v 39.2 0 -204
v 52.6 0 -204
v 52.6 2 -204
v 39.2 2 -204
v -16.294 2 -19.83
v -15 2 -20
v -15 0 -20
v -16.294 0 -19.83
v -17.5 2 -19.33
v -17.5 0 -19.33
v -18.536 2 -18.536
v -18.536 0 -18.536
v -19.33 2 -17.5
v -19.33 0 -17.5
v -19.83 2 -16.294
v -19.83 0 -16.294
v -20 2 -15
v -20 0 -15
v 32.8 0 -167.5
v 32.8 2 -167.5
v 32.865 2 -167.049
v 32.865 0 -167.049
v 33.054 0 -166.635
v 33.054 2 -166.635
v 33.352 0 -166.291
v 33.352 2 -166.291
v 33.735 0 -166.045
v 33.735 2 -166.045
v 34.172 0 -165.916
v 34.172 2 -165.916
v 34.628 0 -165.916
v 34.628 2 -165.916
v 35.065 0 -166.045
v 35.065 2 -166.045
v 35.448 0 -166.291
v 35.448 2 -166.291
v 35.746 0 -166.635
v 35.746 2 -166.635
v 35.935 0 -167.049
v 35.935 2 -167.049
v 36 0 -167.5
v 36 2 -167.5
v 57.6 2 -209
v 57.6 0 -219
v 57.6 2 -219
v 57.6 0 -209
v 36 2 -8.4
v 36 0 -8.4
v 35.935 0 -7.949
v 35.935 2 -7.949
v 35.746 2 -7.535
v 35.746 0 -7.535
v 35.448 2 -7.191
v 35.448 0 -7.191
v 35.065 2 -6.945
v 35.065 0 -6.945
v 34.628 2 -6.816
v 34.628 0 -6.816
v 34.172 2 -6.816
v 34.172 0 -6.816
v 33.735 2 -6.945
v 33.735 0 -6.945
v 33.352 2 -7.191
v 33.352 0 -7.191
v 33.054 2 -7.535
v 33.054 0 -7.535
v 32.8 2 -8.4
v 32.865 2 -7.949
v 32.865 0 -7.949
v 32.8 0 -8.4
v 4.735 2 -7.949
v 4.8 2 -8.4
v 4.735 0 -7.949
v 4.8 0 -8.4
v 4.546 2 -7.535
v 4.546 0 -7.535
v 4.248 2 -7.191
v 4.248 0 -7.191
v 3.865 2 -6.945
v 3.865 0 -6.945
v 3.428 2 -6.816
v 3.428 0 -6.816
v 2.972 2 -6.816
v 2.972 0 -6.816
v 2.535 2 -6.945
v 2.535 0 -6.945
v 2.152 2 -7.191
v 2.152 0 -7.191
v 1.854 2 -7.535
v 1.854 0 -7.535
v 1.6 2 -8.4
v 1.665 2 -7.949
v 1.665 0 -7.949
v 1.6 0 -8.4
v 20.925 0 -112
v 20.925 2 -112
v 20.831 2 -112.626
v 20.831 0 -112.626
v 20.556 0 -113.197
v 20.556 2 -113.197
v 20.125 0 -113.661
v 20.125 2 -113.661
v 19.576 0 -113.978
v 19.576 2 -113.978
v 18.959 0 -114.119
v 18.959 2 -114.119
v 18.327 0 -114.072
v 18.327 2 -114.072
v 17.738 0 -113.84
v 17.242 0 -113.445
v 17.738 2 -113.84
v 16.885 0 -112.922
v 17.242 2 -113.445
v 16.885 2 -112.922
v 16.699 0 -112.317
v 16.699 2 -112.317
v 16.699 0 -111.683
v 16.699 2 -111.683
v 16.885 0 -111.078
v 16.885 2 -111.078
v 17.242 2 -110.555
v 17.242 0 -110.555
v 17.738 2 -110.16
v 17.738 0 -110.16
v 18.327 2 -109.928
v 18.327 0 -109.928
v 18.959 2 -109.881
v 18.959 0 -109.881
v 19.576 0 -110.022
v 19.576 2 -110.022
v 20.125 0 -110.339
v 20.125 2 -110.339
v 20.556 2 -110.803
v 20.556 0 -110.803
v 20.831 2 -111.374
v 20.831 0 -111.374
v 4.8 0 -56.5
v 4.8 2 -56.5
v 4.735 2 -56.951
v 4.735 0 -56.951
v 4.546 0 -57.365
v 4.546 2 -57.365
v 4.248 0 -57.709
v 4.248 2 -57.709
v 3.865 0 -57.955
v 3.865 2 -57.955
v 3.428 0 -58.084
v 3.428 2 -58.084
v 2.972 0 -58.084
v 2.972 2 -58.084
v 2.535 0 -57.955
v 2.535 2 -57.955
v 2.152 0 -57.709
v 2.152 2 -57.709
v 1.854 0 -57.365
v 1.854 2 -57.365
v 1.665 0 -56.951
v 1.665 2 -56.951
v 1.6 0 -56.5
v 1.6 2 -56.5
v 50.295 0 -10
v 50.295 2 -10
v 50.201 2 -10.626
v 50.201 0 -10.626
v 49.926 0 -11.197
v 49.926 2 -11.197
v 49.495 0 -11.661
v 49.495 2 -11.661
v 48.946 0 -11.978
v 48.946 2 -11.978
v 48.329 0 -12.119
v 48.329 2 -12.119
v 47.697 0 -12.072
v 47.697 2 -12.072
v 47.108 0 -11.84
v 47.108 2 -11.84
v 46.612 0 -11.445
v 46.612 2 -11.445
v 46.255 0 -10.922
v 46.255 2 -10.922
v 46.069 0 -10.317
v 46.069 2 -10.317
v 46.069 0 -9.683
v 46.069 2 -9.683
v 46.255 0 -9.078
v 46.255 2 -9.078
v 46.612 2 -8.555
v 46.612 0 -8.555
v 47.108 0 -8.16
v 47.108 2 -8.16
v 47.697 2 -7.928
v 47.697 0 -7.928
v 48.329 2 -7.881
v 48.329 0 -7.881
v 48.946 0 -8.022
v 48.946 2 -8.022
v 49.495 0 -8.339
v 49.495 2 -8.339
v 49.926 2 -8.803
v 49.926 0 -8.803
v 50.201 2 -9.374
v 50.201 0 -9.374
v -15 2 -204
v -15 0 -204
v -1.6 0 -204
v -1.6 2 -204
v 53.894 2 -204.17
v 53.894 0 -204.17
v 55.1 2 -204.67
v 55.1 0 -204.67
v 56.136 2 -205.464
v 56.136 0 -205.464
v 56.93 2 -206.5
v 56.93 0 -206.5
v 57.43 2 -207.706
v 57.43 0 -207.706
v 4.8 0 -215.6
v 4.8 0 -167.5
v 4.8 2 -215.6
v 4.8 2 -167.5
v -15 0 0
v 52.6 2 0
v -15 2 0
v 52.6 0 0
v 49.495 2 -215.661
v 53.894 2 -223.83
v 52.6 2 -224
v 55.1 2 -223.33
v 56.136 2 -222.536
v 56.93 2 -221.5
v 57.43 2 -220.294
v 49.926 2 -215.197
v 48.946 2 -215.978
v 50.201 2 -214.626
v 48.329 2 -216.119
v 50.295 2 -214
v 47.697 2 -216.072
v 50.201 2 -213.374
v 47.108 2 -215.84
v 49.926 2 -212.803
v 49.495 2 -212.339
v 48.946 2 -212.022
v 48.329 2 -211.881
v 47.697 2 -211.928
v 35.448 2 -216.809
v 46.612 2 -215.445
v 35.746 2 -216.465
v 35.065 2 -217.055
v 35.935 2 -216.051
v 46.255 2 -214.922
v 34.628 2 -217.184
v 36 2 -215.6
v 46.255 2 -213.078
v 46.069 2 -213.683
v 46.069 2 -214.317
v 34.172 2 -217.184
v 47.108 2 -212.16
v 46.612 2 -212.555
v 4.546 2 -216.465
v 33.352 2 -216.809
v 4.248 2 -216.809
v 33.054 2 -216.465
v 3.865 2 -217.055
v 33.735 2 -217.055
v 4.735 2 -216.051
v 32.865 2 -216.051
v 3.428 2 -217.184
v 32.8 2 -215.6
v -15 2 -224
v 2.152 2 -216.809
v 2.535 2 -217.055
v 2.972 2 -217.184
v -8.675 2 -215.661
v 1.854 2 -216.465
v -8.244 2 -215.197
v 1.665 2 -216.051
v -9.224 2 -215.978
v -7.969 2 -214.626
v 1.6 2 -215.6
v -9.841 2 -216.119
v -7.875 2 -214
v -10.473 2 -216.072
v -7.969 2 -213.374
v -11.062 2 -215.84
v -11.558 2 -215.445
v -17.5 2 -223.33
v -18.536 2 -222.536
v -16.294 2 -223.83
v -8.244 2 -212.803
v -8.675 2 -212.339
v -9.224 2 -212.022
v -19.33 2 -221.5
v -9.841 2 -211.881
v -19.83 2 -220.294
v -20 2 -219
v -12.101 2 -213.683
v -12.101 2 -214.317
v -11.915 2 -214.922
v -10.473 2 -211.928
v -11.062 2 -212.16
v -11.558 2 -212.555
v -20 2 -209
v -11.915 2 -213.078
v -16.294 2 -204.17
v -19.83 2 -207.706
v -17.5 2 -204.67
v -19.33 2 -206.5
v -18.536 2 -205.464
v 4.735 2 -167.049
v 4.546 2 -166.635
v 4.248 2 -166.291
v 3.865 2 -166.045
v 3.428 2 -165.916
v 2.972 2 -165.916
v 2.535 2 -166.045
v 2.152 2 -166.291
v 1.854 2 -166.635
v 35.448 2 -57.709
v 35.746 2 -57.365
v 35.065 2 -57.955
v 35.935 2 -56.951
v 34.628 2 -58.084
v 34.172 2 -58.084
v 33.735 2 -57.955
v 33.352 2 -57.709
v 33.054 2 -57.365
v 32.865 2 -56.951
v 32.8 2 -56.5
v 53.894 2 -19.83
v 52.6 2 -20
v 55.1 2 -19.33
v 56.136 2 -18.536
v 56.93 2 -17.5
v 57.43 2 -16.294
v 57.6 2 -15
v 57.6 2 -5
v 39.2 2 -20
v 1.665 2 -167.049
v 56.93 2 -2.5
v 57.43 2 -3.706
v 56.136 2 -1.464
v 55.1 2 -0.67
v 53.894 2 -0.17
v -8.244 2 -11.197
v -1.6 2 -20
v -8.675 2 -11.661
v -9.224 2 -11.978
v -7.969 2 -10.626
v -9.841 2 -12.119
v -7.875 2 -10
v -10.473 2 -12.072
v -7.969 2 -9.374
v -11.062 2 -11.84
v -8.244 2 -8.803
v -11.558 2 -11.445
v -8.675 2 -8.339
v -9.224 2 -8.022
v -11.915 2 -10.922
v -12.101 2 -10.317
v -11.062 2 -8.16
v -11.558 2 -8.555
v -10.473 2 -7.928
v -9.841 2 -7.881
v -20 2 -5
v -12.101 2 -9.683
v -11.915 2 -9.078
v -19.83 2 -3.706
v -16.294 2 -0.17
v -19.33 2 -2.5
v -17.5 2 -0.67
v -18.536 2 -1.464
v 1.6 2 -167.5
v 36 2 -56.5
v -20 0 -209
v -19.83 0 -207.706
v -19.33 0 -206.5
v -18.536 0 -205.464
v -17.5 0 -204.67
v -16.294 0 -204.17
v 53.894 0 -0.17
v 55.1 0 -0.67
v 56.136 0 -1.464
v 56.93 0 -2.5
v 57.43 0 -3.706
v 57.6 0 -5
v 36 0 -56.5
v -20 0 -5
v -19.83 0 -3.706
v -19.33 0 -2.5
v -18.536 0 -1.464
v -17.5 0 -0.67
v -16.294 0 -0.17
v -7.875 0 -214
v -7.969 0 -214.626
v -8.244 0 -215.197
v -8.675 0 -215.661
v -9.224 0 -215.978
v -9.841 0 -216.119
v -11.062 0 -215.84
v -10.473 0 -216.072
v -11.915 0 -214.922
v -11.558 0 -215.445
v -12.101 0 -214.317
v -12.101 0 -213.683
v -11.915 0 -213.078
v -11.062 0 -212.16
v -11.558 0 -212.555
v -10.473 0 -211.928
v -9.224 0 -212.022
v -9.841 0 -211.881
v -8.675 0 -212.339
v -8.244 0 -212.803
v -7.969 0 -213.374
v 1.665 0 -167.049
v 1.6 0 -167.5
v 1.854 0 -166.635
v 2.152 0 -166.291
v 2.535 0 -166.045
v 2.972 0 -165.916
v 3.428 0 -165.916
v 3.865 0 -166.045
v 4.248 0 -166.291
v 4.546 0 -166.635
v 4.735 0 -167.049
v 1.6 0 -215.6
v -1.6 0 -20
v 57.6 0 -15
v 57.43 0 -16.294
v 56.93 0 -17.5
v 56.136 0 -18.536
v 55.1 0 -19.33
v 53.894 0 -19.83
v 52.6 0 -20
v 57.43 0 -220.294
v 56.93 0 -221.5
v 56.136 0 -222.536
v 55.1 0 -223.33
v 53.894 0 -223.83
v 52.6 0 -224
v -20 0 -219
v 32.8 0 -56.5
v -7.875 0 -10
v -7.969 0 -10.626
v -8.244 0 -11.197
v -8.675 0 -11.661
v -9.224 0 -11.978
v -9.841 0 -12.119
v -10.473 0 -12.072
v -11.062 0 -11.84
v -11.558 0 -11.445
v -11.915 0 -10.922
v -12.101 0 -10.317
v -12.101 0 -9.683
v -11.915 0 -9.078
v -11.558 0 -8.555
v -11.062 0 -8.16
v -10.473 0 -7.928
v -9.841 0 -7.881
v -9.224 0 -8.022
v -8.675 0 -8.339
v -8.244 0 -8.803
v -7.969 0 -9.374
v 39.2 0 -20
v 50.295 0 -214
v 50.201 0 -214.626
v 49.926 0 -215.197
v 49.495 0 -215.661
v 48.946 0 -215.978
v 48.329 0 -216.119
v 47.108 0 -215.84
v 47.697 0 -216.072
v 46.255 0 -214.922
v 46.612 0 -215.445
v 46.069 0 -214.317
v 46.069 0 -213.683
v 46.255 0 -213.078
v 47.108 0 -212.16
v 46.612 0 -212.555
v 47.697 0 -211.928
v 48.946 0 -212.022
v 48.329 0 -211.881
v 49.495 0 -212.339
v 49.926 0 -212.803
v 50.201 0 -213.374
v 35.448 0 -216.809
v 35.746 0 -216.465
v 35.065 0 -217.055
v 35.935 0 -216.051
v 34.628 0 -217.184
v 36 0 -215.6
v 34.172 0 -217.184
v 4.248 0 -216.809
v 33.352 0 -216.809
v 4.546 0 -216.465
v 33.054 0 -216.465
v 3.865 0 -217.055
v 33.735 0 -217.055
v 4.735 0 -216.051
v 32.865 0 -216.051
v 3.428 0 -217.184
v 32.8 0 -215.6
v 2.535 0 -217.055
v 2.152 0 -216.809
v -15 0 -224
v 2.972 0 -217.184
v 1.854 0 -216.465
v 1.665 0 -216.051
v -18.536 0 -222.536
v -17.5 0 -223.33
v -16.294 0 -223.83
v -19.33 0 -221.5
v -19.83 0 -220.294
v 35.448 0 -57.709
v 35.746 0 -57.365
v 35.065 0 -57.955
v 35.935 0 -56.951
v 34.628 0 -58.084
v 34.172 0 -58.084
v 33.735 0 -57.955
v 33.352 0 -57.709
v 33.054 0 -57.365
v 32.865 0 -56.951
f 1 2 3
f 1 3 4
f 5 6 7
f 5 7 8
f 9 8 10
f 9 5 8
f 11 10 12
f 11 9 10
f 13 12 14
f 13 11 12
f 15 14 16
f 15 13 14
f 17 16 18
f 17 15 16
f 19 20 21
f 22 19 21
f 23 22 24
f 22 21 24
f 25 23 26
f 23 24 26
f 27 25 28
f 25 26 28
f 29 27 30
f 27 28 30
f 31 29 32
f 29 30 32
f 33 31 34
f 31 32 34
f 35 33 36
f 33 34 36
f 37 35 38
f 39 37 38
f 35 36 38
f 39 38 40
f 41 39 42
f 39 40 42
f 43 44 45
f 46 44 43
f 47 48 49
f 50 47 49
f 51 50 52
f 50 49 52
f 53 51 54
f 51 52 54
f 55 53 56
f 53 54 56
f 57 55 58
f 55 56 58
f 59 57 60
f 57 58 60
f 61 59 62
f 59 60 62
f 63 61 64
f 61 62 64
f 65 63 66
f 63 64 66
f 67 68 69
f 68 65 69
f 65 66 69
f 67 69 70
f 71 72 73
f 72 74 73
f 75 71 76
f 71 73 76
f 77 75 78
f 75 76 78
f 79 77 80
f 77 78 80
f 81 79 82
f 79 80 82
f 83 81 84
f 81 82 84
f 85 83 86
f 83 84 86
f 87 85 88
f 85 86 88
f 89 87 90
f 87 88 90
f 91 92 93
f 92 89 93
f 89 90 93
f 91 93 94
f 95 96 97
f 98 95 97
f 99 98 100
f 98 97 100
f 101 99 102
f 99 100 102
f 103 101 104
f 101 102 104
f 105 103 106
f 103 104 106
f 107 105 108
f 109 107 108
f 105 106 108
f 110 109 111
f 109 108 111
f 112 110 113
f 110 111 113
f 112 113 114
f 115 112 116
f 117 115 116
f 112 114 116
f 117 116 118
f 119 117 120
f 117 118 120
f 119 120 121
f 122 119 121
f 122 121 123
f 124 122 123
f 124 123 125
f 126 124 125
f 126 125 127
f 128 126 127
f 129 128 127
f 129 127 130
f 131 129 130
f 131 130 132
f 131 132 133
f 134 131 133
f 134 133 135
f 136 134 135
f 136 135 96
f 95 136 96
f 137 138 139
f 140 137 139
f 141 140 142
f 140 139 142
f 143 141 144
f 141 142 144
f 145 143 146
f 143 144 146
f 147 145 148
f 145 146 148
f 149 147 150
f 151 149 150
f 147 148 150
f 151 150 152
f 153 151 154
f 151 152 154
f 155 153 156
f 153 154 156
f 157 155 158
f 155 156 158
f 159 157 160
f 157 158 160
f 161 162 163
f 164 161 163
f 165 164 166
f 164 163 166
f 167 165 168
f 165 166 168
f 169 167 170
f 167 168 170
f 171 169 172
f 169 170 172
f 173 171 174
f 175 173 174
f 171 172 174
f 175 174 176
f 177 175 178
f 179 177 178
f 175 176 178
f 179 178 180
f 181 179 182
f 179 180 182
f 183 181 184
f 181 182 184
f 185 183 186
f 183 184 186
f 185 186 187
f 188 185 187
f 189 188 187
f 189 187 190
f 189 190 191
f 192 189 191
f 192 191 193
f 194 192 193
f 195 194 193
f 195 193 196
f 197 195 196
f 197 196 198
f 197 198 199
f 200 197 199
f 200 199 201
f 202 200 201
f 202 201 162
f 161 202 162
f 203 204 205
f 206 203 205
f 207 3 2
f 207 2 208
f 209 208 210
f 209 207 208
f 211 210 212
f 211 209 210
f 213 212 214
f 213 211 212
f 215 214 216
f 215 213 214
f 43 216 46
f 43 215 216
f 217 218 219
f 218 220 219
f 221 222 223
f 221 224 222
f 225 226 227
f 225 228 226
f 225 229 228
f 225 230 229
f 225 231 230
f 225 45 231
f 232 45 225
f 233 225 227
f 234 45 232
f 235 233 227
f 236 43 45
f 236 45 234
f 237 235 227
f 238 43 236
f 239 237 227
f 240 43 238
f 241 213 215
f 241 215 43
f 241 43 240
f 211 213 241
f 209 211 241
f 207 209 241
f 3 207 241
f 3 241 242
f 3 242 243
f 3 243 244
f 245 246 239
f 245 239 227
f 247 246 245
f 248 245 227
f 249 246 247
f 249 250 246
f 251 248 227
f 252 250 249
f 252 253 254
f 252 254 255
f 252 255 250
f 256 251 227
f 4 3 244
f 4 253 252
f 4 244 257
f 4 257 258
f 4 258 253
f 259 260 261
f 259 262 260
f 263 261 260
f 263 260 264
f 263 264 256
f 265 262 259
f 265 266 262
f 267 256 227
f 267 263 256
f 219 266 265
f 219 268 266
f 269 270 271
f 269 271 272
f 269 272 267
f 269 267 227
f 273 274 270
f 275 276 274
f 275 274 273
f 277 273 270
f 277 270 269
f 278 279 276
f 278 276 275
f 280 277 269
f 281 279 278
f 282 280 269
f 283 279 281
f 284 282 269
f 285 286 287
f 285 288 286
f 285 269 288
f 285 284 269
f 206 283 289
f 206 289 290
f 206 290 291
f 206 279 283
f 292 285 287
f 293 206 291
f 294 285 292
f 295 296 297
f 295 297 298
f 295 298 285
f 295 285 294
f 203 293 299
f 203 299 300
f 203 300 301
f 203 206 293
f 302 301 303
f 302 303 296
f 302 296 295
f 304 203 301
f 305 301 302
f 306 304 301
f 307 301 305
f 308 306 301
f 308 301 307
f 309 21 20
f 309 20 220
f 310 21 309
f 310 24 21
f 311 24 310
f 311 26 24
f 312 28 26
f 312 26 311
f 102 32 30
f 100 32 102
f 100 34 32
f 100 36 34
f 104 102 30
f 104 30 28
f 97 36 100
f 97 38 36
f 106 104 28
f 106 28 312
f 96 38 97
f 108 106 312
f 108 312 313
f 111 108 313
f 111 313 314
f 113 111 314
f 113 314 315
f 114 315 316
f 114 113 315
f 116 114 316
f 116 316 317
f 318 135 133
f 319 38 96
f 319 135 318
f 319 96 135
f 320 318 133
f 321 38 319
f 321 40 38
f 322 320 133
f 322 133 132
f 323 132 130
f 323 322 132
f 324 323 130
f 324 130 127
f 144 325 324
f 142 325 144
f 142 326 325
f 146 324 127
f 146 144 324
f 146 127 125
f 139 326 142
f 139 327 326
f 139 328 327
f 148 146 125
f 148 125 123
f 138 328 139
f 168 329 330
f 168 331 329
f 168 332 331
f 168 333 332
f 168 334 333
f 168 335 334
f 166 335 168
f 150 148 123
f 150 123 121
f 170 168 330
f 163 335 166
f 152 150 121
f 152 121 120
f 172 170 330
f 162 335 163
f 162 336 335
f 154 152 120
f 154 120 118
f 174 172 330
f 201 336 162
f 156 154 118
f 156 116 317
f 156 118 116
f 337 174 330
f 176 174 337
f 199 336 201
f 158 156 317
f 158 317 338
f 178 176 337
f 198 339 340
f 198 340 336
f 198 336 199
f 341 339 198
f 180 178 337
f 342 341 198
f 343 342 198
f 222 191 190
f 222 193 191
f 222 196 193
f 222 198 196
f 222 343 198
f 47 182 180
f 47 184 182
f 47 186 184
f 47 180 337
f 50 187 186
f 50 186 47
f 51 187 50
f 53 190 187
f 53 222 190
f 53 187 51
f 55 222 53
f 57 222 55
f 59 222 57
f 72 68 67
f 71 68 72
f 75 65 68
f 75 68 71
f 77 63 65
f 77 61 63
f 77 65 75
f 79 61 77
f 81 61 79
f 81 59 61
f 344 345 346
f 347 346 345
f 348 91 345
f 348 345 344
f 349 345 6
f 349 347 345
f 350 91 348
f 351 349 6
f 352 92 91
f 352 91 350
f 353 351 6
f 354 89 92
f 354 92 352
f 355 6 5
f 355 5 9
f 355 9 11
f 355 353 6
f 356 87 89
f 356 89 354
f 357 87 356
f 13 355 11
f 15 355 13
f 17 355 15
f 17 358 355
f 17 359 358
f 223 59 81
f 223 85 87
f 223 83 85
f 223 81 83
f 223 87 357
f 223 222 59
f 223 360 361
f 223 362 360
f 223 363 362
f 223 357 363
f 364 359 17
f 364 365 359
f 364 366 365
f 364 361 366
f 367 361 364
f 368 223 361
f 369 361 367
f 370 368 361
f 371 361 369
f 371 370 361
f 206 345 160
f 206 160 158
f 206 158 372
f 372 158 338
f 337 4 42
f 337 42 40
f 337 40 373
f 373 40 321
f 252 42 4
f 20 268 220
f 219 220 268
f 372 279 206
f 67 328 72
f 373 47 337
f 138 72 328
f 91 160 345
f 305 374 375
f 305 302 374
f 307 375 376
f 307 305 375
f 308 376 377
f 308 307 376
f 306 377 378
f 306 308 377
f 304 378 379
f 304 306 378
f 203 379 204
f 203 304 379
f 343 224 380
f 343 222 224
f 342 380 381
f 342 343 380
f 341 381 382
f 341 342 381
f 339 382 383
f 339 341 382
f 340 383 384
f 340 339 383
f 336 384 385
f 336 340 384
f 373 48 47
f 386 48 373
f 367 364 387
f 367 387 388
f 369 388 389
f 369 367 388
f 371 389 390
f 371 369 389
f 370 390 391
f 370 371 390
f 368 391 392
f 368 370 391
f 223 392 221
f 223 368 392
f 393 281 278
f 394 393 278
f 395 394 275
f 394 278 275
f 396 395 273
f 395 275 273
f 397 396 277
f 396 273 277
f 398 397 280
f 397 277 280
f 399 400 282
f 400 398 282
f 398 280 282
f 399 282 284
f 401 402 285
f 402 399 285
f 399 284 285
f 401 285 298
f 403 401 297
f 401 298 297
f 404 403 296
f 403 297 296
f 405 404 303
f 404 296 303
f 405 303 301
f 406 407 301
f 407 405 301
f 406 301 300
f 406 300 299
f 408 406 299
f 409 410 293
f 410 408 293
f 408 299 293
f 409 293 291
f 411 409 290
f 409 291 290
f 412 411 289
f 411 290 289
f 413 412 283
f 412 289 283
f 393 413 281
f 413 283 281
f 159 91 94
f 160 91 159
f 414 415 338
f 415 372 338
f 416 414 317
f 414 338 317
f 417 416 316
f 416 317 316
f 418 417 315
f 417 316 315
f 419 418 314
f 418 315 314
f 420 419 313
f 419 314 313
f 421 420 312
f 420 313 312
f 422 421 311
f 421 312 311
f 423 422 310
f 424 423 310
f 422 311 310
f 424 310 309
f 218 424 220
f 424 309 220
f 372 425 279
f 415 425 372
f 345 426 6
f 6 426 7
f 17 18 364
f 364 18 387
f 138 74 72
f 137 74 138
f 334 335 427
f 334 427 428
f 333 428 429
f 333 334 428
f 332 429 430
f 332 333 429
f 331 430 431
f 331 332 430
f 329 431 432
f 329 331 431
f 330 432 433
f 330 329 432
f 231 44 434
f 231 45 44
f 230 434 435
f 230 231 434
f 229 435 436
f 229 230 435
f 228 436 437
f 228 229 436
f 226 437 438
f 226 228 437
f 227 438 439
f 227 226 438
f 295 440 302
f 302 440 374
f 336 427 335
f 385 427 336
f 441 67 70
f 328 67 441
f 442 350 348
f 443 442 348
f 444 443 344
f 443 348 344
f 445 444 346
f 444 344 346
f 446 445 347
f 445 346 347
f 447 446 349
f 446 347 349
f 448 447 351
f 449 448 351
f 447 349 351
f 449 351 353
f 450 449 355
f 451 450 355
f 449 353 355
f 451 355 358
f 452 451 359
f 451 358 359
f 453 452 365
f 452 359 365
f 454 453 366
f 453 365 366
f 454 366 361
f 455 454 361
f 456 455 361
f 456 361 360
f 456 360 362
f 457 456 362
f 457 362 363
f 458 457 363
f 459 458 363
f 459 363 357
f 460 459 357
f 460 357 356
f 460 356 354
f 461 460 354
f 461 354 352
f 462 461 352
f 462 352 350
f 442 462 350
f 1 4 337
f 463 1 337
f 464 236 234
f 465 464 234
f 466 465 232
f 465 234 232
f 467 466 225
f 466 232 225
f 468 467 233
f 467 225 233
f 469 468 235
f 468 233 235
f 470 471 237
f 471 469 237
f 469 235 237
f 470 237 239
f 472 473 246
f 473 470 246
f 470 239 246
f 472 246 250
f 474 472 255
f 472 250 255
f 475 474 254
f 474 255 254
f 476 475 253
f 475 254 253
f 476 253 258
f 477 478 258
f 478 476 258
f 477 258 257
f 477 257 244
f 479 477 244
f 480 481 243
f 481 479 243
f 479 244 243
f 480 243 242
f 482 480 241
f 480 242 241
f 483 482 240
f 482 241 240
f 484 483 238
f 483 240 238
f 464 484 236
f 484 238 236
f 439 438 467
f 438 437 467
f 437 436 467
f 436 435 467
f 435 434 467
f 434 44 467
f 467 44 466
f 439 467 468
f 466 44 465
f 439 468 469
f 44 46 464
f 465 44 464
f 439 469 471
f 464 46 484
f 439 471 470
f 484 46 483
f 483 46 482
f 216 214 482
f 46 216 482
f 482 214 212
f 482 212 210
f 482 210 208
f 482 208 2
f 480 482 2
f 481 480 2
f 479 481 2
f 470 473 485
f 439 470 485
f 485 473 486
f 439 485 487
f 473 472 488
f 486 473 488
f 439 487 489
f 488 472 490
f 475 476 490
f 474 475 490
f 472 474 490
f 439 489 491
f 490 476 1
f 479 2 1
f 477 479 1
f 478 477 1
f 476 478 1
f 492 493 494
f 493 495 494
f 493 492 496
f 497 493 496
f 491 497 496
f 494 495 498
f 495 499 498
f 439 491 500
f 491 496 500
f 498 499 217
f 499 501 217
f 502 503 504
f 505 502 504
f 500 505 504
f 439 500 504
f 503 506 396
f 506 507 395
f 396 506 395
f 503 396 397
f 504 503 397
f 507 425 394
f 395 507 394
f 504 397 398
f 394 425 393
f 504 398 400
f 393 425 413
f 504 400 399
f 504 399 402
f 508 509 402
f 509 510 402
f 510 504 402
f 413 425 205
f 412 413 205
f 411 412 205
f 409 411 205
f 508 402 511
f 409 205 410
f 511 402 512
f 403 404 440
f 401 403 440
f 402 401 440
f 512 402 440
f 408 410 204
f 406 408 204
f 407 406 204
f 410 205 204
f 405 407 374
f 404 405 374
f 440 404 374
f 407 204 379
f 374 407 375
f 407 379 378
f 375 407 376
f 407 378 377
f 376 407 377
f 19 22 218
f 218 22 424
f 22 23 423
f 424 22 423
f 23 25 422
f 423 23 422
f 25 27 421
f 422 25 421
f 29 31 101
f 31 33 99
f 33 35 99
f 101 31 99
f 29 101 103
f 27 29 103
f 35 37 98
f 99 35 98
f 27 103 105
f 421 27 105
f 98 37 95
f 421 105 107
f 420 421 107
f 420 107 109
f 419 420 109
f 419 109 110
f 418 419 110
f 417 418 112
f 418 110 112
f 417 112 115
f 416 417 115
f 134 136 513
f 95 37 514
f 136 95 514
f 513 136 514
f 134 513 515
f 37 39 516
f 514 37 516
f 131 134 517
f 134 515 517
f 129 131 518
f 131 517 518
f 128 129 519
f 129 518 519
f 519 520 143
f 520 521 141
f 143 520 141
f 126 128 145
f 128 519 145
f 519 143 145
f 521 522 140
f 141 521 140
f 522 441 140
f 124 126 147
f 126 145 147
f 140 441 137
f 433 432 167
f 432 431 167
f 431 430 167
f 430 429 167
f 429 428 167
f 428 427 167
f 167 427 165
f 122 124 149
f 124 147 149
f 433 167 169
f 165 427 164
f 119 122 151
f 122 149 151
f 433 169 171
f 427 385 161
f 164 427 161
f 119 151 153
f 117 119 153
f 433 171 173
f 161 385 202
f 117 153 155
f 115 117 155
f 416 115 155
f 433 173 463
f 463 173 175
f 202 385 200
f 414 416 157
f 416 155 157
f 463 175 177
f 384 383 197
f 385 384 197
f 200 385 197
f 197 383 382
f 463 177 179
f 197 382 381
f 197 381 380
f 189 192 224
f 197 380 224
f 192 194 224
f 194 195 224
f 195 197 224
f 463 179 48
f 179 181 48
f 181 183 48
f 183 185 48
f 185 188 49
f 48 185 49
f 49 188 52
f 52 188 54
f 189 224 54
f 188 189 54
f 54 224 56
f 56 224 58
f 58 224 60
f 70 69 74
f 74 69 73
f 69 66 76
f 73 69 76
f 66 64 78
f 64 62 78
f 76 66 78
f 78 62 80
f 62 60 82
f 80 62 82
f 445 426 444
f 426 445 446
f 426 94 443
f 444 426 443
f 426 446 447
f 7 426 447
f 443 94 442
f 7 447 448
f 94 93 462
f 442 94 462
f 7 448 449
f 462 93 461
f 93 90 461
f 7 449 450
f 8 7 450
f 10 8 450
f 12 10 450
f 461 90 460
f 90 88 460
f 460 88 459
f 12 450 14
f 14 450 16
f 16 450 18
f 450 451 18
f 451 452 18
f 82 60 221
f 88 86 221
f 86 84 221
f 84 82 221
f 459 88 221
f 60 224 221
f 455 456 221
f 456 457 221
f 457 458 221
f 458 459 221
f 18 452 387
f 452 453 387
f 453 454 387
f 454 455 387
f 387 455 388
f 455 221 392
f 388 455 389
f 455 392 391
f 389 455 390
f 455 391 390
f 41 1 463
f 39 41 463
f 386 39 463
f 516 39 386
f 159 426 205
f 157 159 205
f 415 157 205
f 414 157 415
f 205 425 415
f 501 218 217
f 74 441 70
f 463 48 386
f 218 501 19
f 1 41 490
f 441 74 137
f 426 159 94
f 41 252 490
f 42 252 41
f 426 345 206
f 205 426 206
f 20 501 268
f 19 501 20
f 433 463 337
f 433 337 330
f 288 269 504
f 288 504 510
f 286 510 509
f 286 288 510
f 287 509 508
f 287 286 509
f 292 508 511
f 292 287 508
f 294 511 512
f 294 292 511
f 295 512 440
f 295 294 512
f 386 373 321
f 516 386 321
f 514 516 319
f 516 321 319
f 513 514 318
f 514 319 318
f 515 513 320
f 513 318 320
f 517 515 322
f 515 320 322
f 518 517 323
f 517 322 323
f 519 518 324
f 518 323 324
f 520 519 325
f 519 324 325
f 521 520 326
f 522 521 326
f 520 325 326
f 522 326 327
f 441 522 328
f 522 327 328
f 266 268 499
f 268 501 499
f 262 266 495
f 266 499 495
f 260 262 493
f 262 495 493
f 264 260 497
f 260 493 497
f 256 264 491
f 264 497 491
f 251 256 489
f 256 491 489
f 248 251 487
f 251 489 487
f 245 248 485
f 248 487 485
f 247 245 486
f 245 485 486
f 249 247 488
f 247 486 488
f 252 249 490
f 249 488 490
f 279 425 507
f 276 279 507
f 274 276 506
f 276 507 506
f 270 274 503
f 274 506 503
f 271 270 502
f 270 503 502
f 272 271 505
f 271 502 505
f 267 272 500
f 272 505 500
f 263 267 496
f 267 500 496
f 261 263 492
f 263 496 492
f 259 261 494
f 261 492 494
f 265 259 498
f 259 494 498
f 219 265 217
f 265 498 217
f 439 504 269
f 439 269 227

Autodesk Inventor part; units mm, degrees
ref_plane "YZ Plane" through (0, 0, 0) normal (1, 0, 0) x (0, 1, 0)
ref_plane "XZ Plane" through (0, 0, 0) normal (0, 1, 0) x (-1, 0, 0)
ref_plane "XY Plane" through (0, 0, 0) normal (0, 0, 1) x (1, 0, 0)
sketch "Sketch1" plane through (0, 0, 0) normal (0, 1, 0) x (-1, 0, 0)
  line L0 (0, 0) -> (-37.6, 0)
  line L1 (-37.6, -20) -> (-37.6, -51.2)
  line L2 (-37.6, -51.2) -> (0, -51.2)
  line L3 (0, -51.2) -> (0, -20)
  line L4 (-18.8, 0) -> (-1.65, 0)
  line L5 (-1.65, 0) -> (-23.35, 0)
  line L6 (-18.8, 0) -> (5.35, 0)
  line L7 (5.35, 0) -> (-25.85, 0)
  line L8 (-18.8, 0) -> (-3.2, 0)
  line L9 (-3.2, 0) -> (-34.4, 0)
  arc A0 (-32.8, -8.4) -> (-36, -8.4) centre (-34.4, -8.4) ccw
  arc A1 (-36, -46.5) -> (-32.8, -46.5) centre (-34.4, -46.5) ccw
  arc A2 (-1.6, -8.4) -> (-4.8, -8.4) centre (-3.2, -8.4) ccw
  arc A3 (-4.8, -46.5) -> (-1.6, -46.5) centre (-3.2, -46.5) ccw
  line L10 (0, 0) -> (0, -20)
  line L11 (0, -20) -> (20, -20)
  line L12 (20, -20) -> (20, 0)
  line L13 (20, 0) -> (0, 0)
  line L14 (-37.6, -20) -> (-57.6, -20)
  line L15 (-57.6, -20) -> (-57.6, 0)
  line L16 (-57.6, 0) -> (-37.6, 0)
  line L17 (-1.6, -46.5) -> (-1.6, -8.4)
  line L18 (-4.8, -8.4) -> (-4.8, -46.5)
  line L19 (-32.8, -46.5) -> (-32.8, -8.4)
  line L20 (-36, -8.4) -> (-36, -46.5)
  point P0 (5.35, 0)
  dimension "d0" = 37.6
  dimension "d1" = 51.2
  dimension "d41" = 15.6
  dimension "d42" = 31.2
  dimension "d50" = 3.2
  dimension "d56" = 3.2
  dimension "d57" = 3.2
  dimension "d63" = 3.2
  dimension "d67" = 8.4
  dimension "d77" = 8.4
  dimension "d81" = 20
  dimension "d82" = 20
  dimension "d83" = 20
extrude "Extrusion3" add sketch "Sketch1" along normal blind 2
sketch "Sketch2" plane through (0, 2, 0) normal (0, 1, 0) x (1, 0, 0)
  circle A0 centre (-10, 10) radius 2.125
  line L0 (-20, 0) -> (57.6, 0) projected
  line L1 (38.17, 0) -> (48.17, 0)
  circle A1 centre (48.17, 10) radius 2.125
  point P0 (0, 0)
  dimension "d85" = 4.25
  dimension "d86" = 10
  dimension "d88" = 4.25
extrude "Extrusion4" cut sketch "Sketch2" against normal blind 2
fillet "Fillet3" radius 5 4 edges at (57.6, 1, -20) (57.6, 1, 0) (-20, 1, 0) (-20, 1, -20)
ref_plane "Work Plane2" through (37.6, 0, -112) normal (0, 0, -1) x (-1, 0, 0)
mirror "Mirror2" about plane through (37.6, 0, -112) normal (0, 0, -1)
sketch "Sketch5" plane through (0, 0, 0) normal (0, 1, 0) x (-1, 0, 0)
  line L0 (-37.6, -172.8) -> (0, -172.8)
  line L1 (0, -51.2) -> (-37.6, -51.2)
  line L2 (20, -112) -> (20, -102)
  line L3 (20, -102) -> (0, -102)
  line L4 (20, -112) -> (20, -122)
  line L5 (20, -122) -> (0, -122)
  line L6 (-37.6, -122) -> (-57.6, -122)
  line L7 (-57.6, -122) -> (-57.6, -102)
  line L8 (-57.6, -102) -> (-37.6, -102)
  line L9 (-37.6, -51.2) -> (-37.6, -102)
  line L10 (-37.6, -122) -> (-37.6, -172.8)
  line L11 (0, -172.8) -> (0, -122)
  line L12 (0, -102) -> (0, -51.2)
  circle A0 centre (10, -112) radius 2.125
  circle A1 centre (-47.6, -112) radius 2.125
  point P0 (0, 0)
  dimension "d95" = 10
  dimension "d96" = 10
  dimension "d97" = 20
  dimension "d98" = 4.25
  dimension "d99" = 4.25
extrude "Extrusion5" add sketch "Sketch5" along normal blind 2
fillet "Fillet4" radius 5 4 edges at (57.6, 1, -122) (57.6, 1, -102) (-20, 1, -122) (-20, 1, -102)
sketch "Sketch6" plane through (0, 2, 0) normal (0, 1, 0) x (1, 0, 0)
  arc A0 (4.8, 46.5) -> (1.6, 46.5) centre (3.2, 46.5) ccw projected
  line L0 (3.2, 46.5) -> (13.2, 46.5) construction
  arc A1 (36, 56.5) -> (32.8, 56.5) centre (34.4, 56.5) ccw
  arc A2 (3.2, 54.9) -> (1.6, 56.5) centre (3.2, 56.5) ccw
  arc A3 (36, 46.5) -> (32.8, 46.5) centre (34.4, 46.5) ccw projected
  line L1 (36, 46.5) -> (36, 56.5)
  line L2 (32.8, 46.5) -> (32.8, 56.5)
  line L3 (4.8, 46.5) -> (4.8, 56.5)
  line L4 (1.6, 46.5) -> (1.6, 56.5)
  circle A4 centre (34.4, 46.5) radius 1.6
  circle A5 centre (3.2, 46.5) radius 1.6
  point P0 (0, 0)
extrude "Extrusion6" cut sketch "Sketch6" against normal blind 2 contours A0 L4 A2 L3 | L1 A3 L2 A1
sketch "Sketch7" plane through (0, 2, 0) normal (0, 1, 0) x (1, 0, 0)
  arc A0 (1.6, 177.5) -> (4.8, 177.5) centre (3.2, 177.5) ccw projected
  arc A1 (1.6, 167.5) -> (4.8, 167.5) centre (3.2, 167.5) ccw
  arc A2 (32.8, 167.5) -> (36, 167.5) centre (34.4, 167.5) ccw
  arc A3 (32.8, 177.5) -> (36, 177.5) centre (34.4, 177.5) ccw projected
  line L0 (36, 177.5) -> (36, 167.5)
  line L1 (32.8, 177.5) -> (32.8, 167.5)
  line L2 (1.6, 177.5) -> (1.6, 167.5)
  line L3 (4.8, 167.5) -> (4.8, 177.5)
  arc A4 (1.6, 177.5) -> (4.8, 177.5) centre (3.2, 177.5) ccw
  arc A5 (32.8, 177.5) -> (36, 177.5) centre (34.4, 177.5) ccw
  point P0 (0, 0)
extrude "Extrusion7" cut sketch "Sketch7" against normal blind 2
sketch "Sketch8" plane through (0, 2, 0) normal (0, 1, 0) x (1, 0, 0)
  line L0 (0, 122) -> (-15, 122) projected
  line L1 (0, 122) -> (-20, 122)
  line L2 (-20, 122) -> (-20, 102)
  line L3 (-20, 102) -> (0, 102)
  line L4 (0, 102) -> (0, 122)
  point P0 (0, 0)
extrude "Extrusion8" cut sketch "Sketch8" against normal blind 2
sketch "Sketch9" plane through (0, 2, 0) normal (0, 1, 0) x (1, 0, 0)
  line L0 (52.6, 122) -> (37.6, 122) projected
  line L1 (37.6, 122) -> (57.6, 122)
  line L2 (57.6, 122) -> (57.6, 102)
  line L3 (57.6, 102) -> (37.6, 102)
  line L4 (37.6, 102) -> (37.6, 122)
  point P0 (0, 0)
extrude "Extrusion9" cut sketch "Sketch9" against normal blind 2
sketch "Sketch10" plane through (0, 2, 0) normal (0, 1, 0) x (1, 0, 0)
  line L0 (0, 0) -> (18.8, 0)
  line L1 (-15, 0) -> (52.6, 0) projected
  line L2 (18.8, 0) -> (18.8, 112)
  circle A0 centre (18.8, 112) radius 2.125
  dimension "d114" = 112
  dimension "d115" = 4.25
extrude "Extrusion10" cut sketch "Sketch10" against normal blind 2
sketch "Sketch11" plane through (0, 2, 0) normal (0, 1, 0) x (1, 0, 0)
  line L0 (0, 20) -> (0, 204) projected
  line L1 (0, 204) -> (-15, 204) projected
  line L2 (0, 20) -> (-1.6, 20)
  line L3 (-1.6, 20) -> (-1.6, 204)
  line L4 (-1.6, 204) -> (0, 204)
  line L5 (0, 204) -> (0, 20)
  line L6 (37.6, 20) -> (37.6, 204) projected
  line L7 (37.6, 204) -> (39.2, 204)
  line L8 (39.2, 204) -> (39.2, 20)
  line L9 (39.2, 20) -> (37.6, 20)
  line L10 (37.6, 20) -> (37.6, 204)
  point P0 (0, 0)
  dimension "d118" = 1.6
  dimension "d119" = 1.6
extrude "Extrusion11" add sketch "Sketch11" against normal blind 2
properties part number "Motor Attachment 2.0"
